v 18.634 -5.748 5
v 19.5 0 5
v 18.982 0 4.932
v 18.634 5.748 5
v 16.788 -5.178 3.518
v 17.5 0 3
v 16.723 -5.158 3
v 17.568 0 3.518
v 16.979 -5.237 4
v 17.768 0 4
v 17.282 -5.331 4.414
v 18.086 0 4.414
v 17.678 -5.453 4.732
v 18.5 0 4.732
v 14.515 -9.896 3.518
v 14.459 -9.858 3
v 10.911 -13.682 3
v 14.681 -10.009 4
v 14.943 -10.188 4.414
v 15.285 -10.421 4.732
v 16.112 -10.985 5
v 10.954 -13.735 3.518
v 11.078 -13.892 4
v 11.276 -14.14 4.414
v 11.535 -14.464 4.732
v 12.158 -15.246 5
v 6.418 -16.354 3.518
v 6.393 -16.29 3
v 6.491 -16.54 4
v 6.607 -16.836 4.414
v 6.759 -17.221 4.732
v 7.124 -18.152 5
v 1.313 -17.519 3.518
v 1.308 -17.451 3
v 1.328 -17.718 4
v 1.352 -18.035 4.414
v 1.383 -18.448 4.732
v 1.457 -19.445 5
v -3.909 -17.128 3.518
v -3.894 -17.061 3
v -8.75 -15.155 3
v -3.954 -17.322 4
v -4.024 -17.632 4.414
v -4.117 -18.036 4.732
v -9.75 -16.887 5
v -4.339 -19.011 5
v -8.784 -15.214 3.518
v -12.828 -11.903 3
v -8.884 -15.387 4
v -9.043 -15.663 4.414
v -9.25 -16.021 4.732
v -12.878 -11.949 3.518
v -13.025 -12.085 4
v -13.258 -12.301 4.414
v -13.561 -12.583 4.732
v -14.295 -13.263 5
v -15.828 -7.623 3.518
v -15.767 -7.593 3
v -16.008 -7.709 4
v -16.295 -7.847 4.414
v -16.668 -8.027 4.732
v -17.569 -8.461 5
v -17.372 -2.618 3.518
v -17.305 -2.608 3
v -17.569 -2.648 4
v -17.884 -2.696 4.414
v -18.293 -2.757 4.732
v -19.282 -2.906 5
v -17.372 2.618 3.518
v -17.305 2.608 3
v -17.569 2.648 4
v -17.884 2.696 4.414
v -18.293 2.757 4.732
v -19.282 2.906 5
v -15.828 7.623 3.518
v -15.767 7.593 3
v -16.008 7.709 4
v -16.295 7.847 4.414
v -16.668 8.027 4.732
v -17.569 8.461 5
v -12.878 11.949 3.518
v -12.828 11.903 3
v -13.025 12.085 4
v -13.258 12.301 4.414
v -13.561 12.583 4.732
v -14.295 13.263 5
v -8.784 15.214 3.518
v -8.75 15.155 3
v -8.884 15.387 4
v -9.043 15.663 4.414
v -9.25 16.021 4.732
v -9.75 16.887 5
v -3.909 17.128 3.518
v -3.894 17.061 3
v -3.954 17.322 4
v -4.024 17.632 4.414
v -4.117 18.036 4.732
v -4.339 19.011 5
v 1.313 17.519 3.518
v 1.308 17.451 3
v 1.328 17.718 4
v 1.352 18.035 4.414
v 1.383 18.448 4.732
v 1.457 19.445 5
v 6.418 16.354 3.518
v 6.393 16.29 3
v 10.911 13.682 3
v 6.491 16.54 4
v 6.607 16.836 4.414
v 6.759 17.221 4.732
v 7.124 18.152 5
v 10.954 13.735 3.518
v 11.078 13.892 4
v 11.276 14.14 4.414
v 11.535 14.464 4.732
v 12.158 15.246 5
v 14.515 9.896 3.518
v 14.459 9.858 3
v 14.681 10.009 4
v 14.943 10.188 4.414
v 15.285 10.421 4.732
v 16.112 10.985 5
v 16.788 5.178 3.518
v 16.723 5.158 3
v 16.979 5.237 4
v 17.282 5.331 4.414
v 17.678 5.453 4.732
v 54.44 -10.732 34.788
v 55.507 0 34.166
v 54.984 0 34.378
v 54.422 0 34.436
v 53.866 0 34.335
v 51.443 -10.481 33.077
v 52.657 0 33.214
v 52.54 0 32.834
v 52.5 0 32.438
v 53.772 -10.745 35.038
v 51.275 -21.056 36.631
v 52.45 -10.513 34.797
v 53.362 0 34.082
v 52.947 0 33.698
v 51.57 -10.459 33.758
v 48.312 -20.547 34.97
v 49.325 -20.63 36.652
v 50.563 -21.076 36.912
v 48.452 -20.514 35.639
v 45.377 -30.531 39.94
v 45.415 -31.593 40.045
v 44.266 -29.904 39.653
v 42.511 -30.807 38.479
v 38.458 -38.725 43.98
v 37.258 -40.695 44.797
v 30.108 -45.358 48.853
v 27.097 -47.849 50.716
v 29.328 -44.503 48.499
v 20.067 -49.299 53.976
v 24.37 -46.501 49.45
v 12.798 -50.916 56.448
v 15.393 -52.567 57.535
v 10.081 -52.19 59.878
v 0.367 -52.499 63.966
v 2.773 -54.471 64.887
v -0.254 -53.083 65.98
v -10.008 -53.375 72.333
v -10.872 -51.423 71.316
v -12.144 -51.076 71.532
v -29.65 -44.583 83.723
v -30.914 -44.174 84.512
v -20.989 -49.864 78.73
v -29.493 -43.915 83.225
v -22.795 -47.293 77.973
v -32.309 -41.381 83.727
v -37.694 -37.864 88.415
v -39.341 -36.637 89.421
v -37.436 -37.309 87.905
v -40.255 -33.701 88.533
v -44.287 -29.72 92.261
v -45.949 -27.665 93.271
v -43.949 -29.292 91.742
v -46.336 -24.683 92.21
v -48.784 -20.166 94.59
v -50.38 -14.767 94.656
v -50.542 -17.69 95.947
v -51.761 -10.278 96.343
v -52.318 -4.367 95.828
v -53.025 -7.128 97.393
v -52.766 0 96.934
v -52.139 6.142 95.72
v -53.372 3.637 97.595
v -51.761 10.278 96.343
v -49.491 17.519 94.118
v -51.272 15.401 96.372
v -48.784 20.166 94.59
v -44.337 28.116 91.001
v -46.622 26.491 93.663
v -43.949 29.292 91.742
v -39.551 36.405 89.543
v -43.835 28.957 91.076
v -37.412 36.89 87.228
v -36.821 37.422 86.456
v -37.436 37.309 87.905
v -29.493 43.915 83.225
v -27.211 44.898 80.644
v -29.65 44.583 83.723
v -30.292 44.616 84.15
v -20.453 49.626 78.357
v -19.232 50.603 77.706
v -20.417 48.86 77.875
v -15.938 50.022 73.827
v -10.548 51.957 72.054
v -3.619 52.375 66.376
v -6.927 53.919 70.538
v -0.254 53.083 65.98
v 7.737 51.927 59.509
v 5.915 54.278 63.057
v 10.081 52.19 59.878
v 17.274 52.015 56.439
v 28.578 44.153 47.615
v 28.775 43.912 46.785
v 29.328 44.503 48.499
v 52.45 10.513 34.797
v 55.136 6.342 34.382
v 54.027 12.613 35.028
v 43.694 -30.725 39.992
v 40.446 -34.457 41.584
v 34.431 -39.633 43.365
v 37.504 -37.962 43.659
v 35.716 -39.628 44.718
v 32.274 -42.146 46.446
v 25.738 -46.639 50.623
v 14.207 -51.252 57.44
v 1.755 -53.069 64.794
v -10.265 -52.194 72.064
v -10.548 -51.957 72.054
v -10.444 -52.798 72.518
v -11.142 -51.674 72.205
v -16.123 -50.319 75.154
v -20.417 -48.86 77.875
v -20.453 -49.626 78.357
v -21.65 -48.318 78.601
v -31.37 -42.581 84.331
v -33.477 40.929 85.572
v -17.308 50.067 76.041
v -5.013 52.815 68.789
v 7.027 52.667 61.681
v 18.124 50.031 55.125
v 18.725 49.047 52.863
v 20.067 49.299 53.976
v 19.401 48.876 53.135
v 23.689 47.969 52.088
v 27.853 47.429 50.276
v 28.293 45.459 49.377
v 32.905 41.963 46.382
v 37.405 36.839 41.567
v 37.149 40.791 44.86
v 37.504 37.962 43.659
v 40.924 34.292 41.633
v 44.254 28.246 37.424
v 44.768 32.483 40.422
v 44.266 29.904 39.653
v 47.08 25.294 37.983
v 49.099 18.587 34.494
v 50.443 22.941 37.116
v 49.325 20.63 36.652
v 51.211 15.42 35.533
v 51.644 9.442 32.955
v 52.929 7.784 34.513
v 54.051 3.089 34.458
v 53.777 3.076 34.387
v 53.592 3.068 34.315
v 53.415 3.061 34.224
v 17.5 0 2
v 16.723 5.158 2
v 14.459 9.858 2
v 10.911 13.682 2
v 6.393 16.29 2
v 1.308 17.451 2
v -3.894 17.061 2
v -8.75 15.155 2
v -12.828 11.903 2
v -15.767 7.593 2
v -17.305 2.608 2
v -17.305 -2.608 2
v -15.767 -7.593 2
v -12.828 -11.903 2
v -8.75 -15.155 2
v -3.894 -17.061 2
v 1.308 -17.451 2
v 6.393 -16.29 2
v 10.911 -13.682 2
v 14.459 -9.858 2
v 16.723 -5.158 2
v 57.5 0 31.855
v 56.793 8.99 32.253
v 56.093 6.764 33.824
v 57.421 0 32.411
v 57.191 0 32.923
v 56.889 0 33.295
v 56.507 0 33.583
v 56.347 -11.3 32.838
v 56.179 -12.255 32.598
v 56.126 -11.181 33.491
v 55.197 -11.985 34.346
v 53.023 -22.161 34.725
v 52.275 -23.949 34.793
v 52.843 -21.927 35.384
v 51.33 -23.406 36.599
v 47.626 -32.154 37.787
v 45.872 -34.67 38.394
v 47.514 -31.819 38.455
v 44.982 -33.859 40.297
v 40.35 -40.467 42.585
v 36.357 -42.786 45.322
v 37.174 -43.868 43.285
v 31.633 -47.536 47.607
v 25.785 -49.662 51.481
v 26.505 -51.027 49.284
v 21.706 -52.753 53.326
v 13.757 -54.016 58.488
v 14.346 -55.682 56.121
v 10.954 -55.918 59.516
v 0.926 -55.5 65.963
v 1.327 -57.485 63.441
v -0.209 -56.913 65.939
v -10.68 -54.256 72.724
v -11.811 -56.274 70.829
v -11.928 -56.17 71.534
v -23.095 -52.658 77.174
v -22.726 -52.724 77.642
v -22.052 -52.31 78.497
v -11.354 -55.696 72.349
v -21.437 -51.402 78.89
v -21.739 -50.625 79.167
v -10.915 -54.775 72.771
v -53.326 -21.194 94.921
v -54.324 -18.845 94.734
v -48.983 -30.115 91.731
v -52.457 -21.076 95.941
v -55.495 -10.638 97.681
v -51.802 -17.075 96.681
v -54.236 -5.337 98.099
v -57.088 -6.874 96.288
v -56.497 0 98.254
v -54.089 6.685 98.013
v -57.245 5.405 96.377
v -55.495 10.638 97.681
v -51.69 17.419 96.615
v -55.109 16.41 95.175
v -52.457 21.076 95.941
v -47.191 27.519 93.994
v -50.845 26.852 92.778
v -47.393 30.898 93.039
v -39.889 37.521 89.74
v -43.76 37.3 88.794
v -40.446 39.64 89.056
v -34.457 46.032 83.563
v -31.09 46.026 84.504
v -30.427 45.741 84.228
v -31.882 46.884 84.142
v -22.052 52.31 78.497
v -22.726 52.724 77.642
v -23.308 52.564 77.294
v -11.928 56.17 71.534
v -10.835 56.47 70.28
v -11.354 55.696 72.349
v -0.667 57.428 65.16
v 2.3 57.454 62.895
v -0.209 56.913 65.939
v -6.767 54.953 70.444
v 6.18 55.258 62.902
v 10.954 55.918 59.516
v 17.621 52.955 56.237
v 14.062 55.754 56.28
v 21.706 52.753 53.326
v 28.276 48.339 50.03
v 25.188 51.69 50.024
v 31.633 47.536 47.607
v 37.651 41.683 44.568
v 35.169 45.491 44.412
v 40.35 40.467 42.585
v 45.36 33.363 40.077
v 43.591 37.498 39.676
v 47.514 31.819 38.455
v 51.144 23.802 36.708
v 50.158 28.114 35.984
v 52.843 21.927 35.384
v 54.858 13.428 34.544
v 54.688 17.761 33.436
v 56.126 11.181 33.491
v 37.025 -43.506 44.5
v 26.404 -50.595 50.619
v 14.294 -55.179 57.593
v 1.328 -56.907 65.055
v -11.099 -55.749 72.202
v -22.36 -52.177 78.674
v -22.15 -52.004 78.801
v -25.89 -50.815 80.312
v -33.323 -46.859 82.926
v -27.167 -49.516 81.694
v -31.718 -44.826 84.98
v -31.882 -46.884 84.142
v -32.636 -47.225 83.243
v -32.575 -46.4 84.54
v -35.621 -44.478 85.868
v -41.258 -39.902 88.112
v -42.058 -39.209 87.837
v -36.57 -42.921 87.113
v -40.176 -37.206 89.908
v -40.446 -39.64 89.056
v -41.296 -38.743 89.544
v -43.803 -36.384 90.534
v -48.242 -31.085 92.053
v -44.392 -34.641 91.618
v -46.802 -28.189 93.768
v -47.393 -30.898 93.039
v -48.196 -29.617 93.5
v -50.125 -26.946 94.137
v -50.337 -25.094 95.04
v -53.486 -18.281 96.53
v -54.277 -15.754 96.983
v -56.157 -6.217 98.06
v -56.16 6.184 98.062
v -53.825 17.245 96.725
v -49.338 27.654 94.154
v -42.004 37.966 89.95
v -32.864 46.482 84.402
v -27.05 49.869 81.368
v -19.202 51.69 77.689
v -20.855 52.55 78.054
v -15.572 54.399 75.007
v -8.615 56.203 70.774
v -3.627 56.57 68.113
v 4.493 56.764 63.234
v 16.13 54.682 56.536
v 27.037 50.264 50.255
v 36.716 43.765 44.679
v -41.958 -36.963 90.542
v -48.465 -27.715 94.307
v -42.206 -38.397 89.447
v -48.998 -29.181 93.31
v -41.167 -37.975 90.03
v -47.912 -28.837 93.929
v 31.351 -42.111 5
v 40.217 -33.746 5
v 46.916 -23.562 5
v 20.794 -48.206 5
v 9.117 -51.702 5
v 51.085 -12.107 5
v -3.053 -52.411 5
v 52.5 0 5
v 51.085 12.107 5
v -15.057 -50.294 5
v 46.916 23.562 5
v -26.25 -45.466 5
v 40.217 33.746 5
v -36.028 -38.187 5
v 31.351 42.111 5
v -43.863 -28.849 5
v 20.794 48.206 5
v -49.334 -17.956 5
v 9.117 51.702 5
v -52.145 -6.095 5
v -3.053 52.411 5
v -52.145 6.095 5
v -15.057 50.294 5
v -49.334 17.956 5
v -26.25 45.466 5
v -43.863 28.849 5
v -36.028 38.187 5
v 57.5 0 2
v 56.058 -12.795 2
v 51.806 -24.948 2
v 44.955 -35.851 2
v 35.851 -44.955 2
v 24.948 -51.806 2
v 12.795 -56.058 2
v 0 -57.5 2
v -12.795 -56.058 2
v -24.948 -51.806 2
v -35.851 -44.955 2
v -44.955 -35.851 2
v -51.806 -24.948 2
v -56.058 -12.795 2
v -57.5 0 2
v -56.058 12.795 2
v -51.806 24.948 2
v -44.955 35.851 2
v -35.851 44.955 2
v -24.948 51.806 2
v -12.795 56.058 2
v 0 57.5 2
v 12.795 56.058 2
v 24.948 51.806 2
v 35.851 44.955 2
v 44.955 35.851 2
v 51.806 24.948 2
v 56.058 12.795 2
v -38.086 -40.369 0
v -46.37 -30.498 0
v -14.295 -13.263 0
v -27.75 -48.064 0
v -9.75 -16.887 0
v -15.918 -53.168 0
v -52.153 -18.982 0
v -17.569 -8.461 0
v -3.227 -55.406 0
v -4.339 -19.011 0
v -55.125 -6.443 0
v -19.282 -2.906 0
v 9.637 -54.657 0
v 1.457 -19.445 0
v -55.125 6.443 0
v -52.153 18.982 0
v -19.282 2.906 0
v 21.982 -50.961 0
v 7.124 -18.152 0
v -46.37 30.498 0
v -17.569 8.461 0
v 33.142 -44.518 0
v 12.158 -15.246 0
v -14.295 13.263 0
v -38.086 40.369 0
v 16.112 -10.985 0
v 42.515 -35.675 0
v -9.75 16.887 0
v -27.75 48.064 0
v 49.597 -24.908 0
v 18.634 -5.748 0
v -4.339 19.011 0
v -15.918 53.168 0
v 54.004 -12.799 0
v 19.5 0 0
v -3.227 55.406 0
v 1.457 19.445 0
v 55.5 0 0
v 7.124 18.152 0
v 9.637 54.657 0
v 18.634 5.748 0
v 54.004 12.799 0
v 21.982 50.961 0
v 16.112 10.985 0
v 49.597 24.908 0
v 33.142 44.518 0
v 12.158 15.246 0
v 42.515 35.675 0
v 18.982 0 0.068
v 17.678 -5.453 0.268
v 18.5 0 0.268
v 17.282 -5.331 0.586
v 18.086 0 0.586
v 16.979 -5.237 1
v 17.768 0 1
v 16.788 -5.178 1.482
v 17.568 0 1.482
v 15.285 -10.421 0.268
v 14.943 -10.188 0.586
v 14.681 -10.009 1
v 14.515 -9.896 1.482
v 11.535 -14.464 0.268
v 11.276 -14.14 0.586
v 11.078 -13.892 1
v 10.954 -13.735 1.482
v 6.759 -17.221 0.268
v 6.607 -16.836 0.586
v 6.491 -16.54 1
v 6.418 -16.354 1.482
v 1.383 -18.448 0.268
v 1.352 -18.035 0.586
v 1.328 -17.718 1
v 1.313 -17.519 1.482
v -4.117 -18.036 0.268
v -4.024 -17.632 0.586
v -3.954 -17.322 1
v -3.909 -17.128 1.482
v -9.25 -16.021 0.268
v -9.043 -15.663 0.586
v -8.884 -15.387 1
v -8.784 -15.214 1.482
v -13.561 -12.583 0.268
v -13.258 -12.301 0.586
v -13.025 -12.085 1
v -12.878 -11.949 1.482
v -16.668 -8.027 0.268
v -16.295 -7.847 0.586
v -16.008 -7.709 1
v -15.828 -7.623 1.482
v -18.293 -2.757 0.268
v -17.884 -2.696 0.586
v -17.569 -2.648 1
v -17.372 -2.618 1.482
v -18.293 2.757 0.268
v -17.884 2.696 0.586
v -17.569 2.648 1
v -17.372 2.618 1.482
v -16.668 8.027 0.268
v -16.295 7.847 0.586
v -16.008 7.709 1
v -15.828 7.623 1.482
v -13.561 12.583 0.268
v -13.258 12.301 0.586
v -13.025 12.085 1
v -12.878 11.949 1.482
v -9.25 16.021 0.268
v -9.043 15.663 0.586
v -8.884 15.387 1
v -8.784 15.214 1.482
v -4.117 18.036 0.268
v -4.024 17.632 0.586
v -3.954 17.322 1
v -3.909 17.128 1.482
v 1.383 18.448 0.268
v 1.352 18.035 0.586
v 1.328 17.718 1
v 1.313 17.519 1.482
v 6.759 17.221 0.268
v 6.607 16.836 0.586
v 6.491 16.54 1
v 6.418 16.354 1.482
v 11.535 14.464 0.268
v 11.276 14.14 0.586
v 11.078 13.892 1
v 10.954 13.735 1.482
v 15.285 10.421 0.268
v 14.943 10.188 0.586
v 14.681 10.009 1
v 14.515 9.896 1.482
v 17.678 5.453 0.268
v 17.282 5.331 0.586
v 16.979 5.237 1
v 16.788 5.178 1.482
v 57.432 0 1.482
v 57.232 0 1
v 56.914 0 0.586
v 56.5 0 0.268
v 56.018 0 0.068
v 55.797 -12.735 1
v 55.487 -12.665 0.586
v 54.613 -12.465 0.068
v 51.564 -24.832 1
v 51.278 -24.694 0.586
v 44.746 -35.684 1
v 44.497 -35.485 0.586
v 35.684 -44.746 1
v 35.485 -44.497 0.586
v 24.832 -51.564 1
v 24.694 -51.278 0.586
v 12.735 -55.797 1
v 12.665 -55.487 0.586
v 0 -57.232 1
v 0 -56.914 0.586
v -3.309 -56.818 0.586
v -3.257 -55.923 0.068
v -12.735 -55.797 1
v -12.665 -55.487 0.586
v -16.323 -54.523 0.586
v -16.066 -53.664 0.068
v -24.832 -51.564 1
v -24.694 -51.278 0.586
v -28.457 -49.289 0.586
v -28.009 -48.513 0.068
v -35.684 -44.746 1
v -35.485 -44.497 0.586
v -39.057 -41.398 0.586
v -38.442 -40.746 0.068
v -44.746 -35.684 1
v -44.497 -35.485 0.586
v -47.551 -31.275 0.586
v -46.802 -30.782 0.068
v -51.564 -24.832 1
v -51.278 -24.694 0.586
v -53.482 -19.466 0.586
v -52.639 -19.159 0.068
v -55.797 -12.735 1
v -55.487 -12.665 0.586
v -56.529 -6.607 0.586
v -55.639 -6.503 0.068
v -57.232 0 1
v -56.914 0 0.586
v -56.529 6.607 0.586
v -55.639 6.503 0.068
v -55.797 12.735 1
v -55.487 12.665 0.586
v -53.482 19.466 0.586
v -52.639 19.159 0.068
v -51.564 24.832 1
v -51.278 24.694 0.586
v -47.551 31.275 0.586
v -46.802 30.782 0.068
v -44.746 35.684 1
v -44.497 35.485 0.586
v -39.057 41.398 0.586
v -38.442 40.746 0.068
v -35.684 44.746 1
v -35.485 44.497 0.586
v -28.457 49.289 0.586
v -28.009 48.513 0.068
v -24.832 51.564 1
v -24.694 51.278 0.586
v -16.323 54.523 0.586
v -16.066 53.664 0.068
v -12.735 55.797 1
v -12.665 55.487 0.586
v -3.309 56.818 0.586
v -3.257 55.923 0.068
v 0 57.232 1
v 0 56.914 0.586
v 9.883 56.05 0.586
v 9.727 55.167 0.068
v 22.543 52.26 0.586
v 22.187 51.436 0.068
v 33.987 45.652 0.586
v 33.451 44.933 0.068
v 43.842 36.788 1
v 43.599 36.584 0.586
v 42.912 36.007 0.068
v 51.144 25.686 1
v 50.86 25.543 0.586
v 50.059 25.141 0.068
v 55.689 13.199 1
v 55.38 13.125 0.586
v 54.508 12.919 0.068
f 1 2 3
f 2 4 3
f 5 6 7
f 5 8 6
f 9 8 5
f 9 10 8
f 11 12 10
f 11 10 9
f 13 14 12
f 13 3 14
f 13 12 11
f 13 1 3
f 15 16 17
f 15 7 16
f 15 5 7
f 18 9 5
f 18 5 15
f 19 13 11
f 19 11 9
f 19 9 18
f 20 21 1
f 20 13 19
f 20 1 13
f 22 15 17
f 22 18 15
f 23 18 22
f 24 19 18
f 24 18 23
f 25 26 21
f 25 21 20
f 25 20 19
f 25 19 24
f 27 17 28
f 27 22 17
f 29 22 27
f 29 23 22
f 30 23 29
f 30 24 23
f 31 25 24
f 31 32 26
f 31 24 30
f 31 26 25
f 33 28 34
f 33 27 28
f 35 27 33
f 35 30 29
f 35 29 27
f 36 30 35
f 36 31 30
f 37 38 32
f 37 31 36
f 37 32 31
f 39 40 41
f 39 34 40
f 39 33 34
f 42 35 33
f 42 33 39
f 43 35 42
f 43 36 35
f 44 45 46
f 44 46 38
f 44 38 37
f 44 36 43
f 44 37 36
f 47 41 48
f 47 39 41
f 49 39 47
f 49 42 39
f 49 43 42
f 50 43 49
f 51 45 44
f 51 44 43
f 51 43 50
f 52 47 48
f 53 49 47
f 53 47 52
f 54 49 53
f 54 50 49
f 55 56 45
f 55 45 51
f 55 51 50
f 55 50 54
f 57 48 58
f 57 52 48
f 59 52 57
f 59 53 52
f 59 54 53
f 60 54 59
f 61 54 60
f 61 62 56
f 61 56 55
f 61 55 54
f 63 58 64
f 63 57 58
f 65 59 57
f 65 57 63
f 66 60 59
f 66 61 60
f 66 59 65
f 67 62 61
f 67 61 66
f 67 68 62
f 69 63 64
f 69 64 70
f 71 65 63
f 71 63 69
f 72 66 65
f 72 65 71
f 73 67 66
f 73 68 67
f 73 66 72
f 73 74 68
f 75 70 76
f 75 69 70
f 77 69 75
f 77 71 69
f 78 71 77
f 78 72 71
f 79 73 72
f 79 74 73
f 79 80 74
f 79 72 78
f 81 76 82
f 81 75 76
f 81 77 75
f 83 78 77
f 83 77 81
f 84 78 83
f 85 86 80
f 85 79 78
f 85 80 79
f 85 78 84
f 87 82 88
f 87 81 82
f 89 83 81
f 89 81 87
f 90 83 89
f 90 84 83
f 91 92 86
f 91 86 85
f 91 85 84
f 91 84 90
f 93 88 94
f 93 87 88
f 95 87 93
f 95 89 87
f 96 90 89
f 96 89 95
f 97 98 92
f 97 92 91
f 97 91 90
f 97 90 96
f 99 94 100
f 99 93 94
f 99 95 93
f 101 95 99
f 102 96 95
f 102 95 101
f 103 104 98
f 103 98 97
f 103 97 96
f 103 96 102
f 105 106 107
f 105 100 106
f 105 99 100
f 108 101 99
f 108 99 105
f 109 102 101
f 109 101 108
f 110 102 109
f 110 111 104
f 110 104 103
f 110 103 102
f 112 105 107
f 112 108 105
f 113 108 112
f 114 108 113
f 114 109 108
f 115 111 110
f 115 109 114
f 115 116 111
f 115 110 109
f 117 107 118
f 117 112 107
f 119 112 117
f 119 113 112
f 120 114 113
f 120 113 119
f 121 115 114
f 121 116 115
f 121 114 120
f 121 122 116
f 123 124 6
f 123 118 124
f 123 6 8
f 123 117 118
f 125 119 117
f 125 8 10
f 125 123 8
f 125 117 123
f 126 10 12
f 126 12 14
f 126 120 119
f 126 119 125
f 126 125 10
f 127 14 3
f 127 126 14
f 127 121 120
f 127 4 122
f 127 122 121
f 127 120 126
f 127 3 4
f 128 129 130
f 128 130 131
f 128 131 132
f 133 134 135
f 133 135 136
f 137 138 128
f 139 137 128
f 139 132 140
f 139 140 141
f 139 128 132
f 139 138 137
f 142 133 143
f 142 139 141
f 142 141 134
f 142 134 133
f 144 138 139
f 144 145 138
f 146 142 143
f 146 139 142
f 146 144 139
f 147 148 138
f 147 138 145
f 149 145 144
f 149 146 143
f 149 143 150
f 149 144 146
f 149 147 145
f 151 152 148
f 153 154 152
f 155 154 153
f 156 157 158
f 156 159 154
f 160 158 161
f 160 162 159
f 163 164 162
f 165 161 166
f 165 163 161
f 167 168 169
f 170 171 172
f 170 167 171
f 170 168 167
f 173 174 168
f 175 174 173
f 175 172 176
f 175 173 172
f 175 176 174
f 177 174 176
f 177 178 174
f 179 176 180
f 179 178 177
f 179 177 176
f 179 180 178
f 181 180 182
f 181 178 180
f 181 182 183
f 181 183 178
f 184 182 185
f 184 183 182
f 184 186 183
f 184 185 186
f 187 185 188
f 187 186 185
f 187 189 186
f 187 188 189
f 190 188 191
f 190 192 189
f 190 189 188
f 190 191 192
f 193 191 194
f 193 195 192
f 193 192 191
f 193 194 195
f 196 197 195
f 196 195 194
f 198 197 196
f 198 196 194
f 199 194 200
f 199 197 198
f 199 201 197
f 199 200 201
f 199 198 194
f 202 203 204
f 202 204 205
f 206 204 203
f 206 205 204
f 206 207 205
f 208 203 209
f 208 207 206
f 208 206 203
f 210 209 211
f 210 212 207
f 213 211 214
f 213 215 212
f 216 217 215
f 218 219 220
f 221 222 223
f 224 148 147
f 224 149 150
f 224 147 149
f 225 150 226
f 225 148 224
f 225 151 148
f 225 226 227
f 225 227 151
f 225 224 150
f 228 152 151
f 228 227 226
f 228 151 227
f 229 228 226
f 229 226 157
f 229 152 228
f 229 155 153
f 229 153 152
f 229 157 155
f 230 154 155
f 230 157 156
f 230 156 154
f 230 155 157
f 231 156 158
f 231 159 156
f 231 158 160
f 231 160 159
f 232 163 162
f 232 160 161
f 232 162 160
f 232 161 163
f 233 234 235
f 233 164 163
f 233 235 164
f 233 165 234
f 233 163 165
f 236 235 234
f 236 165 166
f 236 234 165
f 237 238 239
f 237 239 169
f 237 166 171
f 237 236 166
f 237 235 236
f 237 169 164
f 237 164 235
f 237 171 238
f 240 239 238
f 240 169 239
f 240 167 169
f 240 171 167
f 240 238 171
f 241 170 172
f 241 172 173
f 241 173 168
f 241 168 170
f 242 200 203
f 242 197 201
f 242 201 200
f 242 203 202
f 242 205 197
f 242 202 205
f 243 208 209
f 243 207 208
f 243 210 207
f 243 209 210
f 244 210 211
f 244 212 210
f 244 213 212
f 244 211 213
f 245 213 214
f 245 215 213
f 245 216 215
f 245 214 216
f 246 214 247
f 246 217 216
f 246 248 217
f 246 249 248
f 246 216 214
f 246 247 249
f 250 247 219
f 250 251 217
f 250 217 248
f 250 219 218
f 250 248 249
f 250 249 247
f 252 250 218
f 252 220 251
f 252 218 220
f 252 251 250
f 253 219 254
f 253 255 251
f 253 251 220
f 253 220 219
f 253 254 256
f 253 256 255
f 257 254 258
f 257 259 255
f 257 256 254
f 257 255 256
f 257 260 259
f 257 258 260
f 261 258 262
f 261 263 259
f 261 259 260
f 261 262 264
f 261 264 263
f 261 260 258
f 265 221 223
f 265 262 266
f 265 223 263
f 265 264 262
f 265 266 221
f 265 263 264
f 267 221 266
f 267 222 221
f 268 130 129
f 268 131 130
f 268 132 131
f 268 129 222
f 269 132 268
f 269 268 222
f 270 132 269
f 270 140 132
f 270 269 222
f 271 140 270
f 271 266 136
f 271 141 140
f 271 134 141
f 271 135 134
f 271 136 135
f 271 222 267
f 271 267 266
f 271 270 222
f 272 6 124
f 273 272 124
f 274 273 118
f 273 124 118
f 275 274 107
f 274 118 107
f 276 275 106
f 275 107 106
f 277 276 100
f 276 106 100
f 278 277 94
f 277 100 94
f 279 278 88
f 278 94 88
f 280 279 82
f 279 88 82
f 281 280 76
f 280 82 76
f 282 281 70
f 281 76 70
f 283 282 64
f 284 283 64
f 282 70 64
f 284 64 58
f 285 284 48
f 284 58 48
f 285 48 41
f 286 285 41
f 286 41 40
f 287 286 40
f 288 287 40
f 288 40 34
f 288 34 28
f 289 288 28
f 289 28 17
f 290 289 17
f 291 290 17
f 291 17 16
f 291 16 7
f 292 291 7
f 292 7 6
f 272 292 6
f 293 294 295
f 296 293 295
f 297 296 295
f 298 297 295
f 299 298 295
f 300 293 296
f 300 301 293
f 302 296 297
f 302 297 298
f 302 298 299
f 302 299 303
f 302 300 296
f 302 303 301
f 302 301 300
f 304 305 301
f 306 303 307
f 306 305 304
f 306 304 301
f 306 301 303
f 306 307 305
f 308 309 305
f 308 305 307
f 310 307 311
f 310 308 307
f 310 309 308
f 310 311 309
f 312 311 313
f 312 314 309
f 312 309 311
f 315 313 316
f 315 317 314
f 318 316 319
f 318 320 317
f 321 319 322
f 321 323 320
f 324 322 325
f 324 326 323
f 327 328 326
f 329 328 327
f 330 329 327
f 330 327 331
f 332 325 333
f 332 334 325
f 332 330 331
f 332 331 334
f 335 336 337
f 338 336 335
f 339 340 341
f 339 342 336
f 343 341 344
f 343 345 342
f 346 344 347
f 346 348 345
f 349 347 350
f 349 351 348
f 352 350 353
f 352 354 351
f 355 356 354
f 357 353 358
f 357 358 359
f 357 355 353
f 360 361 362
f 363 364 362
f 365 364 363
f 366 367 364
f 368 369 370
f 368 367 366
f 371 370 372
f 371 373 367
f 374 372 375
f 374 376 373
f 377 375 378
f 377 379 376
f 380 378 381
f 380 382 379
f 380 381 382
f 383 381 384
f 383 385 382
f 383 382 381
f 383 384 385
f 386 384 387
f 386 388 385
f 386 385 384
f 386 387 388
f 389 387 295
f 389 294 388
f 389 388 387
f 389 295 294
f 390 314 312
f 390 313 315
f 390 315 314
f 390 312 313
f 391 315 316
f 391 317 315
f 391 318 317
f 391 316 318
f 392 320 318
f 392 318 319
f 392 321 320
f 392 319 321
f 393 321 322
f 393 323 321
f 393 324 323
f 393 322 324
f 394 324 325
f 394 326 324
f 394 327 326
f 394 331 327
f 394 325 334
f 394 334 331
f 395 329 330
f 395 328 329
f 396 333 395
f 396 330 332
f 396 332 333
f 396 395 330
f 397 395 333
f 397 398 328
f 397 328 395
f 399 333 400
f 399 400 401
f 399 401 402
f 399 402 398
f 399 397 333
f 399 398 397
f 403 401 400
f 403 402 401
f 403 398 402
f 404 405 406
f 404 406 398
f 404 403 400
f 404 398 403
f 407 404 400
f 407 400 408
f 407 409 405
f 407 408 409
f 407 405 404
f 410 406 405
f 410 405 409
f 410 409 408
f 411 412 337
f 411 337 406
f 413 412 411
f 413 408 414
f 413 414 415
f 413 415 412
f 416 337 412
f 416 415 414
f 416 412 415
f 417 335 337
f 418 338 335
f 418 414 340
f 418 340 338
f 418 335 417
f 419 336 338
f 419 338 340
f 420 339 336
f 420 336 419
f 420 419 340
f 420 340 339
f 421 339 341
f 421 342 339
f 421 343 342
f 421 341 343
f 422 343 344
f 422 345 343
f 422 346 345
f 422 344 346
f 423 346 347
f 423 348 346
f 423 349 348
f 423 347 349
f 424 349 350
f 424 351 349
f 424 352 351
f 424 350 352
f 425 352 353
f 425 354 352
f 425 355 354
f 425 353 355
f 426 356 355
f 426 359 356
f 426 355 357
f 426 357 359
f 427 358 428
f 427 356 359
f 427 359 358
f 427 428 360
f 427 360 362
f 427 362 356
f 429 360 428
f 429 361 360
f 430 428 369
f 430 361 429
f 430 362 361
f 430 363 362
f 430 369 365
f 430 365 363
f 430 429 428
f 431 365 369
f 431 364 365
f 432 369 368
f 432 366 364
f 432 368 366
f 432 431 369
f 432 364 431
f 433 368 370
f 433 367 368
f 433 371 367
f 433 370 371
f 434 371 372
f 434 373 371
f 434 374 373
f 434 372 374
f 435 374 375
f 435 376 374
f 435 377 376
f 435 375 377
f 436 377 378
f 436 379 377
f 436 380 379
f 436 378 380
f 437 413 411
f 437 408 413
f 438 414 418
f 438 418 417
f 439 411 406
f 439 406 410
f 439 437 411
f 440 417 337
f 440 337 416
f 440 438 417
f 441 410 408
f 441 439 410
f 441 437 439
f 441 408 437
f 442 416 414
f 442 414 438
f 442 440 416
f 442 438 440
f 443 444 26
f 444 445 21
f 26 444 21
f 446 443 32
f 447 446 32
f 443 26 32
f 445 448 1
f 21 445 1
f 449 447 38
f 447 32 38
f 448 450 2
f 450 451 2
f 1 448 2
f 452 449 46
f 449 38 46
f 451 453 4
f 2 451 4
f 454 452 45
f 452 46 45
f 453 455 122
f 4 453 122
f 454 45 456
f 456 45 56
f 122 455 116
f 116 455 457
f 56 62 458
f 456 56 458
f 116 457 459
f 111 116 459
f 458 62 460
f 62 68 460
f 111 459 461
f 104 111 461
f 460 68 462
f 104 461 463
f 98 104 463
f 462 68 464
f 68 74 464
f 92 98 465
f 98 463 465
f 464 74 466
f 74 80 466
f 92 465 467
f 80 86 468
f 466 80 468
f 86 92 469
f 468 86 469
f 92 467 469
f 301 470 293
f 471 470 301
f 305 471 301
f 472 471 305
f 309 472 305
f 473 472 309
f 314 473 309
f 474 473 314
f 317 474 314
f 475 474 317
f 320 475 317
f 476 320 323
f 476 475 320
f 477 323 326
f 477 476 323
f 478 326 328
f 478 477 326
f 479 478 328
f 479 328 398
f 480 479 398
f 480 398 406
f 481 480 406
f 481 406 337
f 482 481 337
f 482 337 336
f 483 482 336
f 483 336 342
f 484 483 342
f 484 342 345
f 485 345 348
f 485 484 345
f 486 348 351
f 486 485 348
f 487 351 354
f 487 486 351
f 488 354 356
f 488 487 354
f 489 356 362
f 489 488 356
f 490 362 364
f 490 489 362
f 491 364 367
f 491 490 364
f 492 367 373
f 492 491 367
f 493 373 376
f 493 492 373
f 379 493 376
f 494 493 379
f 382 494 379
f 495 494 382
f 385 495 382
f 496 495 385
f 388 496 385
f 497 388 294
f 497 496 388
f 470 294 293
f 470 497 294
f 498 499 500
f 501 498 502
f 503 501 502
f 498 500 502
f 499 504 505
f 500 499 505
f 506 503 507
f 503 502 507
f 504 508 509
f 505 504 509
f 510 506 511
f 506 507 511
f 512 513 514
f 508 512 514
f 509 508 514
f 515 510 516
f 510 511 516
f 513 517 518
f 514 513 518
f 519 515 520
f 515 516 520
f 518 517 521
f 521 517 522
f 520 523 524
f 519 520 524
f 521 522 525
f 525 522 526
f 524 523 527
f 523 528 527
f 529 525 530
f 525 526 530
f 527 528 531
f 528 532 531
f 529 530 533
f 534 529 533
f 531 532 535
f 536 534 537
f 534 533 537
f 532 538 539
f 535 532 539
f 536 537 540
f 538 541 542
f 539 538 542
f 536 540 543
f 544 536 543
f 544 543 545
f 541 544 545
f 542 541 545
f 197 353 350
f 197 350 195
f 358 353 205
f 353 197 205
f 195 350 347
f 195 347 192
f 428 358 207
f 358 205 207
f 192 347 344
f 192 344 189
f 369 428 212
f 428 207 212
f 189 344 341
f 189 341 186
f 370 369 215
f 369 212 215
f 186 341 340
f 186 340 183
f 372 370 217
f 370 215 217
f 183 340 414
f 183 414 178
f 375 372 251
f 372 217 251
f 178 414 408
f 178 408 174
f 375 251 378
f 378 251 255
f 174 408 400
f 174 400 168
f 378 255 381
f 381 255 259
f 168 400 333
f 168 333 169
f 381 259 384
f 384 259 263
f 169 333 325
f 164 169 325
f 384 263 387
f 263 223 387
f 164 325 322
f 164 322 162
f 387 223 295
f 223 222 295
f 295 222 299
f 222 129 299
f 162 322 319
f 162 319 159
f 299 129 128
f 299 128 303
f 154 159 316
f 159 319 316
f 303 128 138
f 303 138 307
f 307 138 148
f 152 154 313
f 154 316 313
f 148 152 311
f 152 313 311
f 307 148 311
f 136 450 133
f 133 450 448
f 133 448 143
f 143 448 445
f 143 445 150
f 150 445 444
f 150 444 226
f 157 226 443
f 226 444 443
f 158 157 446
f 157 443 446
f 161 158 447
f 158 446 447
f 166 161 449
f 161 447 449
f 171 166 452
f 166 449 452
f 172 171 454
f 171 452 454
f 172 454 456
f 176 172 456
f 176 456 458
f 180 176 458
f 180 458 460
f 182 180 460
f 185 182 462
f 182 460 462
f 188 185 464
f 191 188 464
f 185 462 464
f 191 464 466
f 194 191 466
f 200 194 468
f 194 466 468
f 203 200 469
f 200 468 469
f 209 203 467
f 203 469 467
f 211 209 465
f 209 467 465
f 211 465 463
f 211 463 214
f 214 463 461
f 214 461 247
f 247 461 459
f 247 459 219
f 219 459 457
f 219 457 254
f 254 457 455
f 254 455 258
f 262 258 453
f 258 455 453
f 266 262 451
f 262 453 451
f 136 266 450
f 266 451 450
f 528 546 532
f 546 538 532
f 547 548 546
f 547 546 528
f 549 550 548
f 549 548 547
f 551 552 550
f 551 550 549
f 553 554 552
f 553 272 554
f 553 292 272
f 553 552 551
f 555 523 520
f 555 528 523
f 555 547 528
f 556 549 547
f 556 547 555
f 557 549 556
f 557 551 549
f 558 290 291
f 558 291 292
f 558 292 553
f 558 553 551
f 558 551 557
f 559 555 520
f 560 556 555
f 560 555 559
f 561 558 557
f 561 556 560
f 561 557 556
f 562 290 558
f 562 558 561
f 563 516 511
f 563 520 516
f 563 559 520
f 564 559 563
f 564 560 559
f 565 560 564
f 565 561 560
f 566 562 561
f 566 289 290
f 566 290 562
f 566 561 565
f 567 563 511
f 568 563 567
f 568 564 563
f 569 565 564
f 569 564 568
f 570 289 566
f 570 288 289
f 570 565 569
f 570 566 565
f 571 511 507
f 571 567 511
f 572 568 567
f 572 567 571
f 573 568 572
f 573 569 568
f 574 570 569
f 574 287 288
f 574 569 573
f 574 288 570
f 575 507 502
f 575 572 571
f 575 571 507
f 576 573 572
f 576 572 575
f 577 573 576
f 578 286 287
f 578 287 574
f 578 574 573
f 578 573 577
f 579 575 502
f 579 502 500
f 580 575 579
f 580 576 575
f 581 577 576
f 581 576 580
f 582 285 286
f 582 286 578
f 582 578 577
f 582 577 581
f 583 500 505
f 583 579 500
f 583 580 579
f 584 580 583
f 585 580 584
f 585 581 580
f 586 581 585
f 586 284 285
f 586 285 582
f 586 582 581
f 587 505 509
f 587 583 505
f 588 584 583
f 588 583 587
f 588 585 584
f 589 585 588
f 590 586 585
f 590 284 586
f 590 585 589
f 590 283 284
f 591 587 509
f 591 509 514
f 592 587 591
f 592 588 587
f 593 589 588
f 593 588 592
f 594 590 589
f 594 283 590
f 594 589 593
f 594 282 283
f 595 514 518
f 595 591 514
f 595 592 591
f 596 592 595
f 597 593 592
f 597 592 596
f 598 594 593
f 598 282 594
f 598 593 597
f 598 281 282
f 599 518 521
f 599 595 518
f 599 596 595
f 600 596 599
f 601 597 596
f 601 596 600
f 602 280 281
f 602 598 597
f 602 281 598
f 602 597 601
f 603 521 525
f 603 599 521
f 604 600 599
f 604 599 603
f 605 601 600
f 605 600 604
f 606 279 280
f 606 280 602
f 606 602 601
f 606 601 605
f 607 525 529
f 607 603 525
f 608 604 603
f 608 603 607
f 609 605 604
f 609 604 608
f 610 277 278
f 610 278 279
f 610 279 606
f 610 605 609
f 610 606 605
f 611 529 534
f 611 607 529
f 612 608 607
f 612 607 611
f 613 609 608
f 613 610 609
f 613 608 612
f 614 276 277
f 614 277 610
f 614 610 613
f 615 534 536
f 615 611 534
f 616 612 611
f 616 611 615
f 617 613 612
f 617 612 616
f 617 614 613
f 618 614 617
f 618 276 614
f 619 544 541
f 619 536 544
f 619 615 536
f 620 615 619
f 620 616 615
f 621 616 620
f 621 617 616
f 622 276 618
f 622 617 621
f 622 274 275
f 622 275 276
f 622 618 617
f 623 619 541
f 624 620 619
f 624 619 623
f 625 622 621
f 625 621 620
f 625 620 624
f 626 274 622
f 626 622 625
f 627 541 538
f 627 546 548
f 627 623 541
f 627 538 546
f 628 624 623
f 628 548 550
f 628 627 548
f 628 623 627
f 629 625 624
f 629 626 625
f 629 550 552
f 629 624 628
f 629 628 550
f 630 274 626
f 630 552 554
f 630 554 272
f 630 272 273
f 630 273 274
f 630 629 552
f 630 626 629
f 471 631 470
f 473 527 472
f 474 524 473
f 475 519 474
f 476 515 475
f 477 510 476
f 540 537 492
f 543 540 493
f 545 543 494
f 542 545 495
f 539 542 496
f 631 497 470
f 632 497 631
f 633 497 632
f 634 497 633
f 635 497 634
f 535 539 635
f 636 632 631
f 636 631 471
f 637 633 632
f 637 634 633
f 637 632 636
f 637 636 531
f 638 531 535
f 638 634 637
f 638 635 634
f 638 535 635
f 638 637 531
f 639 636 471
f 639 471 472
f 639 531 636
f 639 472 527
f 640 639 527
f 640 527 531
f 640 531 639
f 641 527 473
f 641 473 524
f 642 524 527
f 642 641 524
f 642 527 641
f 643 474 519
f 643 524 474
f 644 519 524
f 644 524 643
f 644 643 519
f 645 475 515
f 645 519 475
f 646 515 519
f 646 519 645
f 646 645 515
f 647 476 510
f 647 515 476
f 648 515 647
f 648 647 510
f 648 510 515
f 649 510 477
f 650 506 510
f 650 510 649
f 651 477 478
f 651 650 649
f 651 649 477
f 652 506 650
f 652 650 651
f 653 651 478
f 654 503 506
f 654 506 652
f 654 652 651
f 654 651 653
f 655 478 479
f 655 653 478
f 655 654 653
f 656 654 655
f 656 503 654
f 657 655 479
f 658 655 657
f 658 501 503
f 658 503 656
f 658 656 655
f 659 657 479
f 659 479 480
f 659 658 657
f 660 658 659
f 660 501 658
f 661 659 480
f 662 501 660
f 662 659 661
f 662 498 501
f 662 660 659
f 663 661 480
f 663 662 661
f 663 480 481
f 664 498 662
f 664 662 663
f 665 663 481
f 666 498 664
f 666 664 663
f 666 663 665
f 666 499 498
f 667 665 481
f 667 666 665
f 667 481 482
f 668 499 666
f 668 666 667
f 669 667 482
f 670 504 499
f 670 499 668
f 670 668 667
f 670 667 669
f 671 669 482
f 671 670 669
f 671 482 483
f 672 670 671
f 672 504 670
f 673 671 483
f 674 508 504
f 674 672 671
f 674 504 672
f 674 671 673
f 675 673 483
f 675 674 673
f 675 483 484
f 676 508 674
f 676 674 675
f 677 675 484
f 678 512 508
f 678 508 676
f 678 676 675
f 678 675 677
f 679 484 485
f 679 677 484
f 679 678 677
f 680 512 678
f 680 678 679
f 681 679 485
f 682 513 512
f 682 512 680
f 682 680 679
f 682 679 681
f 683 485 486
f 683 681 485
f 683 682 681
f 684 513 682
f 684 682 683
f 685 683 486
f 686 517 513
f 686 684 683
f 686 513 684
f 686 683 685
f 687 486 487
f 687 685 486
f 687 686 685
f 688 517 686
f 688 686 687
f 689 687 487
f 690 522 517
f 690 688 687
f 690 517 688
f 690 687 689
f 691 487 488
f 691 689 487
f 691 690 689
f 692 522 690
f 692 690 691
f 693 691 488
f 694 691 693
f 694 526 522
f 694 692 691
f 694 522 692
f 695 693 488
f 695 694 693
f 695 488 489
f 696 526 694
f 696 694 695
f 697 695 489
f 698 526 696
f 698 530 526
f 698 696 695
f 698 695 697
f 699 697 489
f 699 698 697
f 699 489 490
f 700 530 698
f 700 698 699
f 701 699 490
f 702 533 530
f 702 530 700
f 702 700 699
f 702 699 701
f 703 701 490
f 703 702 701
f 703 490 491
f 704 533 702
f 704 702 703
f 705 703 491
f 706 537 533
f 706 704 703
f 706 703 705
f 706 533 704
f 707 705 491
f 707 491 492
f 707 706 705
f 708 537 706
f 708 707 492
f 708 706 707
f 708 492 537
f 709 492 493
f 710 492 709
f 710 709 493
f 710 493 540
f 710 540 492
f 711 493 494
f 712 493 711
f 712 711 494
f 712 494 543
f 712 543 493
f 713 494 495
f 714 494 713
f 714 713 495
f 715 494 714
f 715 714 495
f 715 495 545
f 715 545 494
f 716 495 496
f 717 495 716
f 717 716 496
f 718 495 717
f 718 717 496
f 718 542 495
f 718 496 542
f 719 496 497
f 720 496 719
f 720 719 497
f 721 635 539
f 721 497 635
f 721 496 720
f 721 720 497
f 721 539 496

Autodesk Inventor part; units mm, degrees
ref_plane "YZ Plane" through (0, 0, 0) normal (1, 0, 0) x (0, 1, 0)
ref_plane "XZ Plane" through (0, 0, 0) normal (0, 1, 0) x (-1, 0, 0)
ref_plane "XY Plane" through (0, 0, 0) normal (0, 0, 1) x (1, 0, 0)
sketch "Skizze1" plane through (0, 0, 0) normal (0, 0, 1) x (1, 0, 0)
  circle A0 centre (0, 0) radius 52.5
  circle A1 centre (0, 0) radius 57.5
  dimension "d0" = 105
  dimension "d1" = 5
extrude "Extrusion1" add sketch "Skizze1" along normal blind 100
sketch "Skizze2" plane through (0, 0, 0) normal (0, 0, -1) x (-1, 0, 0)
  circle A0 centre (0, 0) radius 52.5
  dimension "d15" = 105
extrude "Extrusion2" add sketch "Skizze2" against normal blind 5
sketch "Skizze3" plane through (0, 0, 0) normal (0, 1, 0) x (-1, 0, 0)
  line L0 (57.5, 100) -> (-57.5, 100) projected
  line L1 (57.5, 100) -> (-57.5, 33.0047)
  line L2 (-57.5, 0) -> (-57.5, 100) projected
  line L3 (57.5, 100) -> (-57.5, 100)
  line L4 (-57.5, 100) -> (-57.5, 33.0047)
fillet "Rundung2" radius 2 1 edges at (-57.5, 0, 0)
sketch "Skizze4" plane through (0, 0, 5) normal (0, 0, 1) x (1, 0, 0)
  circle A0 centre (0, 0) radius 17.5
  dimension "d10" = 35
extrude "Extrusion4" cut sketch "Skizze4" against normal blind 100
fillet "Rundung3" radius 2 2 edges at (-17.5, 0, 0) (-17.5, 0, 5)
extrude "Extrusion5" cut sketch "Skizze3" along normal through all both and the other way through all
fillet "Rundung5" radius 2 3 edges at (-52.5, 0, 97.0872) (0, -57.5, 66.5024) (0, 57.5, 66.5024)
properties part number "cover"
